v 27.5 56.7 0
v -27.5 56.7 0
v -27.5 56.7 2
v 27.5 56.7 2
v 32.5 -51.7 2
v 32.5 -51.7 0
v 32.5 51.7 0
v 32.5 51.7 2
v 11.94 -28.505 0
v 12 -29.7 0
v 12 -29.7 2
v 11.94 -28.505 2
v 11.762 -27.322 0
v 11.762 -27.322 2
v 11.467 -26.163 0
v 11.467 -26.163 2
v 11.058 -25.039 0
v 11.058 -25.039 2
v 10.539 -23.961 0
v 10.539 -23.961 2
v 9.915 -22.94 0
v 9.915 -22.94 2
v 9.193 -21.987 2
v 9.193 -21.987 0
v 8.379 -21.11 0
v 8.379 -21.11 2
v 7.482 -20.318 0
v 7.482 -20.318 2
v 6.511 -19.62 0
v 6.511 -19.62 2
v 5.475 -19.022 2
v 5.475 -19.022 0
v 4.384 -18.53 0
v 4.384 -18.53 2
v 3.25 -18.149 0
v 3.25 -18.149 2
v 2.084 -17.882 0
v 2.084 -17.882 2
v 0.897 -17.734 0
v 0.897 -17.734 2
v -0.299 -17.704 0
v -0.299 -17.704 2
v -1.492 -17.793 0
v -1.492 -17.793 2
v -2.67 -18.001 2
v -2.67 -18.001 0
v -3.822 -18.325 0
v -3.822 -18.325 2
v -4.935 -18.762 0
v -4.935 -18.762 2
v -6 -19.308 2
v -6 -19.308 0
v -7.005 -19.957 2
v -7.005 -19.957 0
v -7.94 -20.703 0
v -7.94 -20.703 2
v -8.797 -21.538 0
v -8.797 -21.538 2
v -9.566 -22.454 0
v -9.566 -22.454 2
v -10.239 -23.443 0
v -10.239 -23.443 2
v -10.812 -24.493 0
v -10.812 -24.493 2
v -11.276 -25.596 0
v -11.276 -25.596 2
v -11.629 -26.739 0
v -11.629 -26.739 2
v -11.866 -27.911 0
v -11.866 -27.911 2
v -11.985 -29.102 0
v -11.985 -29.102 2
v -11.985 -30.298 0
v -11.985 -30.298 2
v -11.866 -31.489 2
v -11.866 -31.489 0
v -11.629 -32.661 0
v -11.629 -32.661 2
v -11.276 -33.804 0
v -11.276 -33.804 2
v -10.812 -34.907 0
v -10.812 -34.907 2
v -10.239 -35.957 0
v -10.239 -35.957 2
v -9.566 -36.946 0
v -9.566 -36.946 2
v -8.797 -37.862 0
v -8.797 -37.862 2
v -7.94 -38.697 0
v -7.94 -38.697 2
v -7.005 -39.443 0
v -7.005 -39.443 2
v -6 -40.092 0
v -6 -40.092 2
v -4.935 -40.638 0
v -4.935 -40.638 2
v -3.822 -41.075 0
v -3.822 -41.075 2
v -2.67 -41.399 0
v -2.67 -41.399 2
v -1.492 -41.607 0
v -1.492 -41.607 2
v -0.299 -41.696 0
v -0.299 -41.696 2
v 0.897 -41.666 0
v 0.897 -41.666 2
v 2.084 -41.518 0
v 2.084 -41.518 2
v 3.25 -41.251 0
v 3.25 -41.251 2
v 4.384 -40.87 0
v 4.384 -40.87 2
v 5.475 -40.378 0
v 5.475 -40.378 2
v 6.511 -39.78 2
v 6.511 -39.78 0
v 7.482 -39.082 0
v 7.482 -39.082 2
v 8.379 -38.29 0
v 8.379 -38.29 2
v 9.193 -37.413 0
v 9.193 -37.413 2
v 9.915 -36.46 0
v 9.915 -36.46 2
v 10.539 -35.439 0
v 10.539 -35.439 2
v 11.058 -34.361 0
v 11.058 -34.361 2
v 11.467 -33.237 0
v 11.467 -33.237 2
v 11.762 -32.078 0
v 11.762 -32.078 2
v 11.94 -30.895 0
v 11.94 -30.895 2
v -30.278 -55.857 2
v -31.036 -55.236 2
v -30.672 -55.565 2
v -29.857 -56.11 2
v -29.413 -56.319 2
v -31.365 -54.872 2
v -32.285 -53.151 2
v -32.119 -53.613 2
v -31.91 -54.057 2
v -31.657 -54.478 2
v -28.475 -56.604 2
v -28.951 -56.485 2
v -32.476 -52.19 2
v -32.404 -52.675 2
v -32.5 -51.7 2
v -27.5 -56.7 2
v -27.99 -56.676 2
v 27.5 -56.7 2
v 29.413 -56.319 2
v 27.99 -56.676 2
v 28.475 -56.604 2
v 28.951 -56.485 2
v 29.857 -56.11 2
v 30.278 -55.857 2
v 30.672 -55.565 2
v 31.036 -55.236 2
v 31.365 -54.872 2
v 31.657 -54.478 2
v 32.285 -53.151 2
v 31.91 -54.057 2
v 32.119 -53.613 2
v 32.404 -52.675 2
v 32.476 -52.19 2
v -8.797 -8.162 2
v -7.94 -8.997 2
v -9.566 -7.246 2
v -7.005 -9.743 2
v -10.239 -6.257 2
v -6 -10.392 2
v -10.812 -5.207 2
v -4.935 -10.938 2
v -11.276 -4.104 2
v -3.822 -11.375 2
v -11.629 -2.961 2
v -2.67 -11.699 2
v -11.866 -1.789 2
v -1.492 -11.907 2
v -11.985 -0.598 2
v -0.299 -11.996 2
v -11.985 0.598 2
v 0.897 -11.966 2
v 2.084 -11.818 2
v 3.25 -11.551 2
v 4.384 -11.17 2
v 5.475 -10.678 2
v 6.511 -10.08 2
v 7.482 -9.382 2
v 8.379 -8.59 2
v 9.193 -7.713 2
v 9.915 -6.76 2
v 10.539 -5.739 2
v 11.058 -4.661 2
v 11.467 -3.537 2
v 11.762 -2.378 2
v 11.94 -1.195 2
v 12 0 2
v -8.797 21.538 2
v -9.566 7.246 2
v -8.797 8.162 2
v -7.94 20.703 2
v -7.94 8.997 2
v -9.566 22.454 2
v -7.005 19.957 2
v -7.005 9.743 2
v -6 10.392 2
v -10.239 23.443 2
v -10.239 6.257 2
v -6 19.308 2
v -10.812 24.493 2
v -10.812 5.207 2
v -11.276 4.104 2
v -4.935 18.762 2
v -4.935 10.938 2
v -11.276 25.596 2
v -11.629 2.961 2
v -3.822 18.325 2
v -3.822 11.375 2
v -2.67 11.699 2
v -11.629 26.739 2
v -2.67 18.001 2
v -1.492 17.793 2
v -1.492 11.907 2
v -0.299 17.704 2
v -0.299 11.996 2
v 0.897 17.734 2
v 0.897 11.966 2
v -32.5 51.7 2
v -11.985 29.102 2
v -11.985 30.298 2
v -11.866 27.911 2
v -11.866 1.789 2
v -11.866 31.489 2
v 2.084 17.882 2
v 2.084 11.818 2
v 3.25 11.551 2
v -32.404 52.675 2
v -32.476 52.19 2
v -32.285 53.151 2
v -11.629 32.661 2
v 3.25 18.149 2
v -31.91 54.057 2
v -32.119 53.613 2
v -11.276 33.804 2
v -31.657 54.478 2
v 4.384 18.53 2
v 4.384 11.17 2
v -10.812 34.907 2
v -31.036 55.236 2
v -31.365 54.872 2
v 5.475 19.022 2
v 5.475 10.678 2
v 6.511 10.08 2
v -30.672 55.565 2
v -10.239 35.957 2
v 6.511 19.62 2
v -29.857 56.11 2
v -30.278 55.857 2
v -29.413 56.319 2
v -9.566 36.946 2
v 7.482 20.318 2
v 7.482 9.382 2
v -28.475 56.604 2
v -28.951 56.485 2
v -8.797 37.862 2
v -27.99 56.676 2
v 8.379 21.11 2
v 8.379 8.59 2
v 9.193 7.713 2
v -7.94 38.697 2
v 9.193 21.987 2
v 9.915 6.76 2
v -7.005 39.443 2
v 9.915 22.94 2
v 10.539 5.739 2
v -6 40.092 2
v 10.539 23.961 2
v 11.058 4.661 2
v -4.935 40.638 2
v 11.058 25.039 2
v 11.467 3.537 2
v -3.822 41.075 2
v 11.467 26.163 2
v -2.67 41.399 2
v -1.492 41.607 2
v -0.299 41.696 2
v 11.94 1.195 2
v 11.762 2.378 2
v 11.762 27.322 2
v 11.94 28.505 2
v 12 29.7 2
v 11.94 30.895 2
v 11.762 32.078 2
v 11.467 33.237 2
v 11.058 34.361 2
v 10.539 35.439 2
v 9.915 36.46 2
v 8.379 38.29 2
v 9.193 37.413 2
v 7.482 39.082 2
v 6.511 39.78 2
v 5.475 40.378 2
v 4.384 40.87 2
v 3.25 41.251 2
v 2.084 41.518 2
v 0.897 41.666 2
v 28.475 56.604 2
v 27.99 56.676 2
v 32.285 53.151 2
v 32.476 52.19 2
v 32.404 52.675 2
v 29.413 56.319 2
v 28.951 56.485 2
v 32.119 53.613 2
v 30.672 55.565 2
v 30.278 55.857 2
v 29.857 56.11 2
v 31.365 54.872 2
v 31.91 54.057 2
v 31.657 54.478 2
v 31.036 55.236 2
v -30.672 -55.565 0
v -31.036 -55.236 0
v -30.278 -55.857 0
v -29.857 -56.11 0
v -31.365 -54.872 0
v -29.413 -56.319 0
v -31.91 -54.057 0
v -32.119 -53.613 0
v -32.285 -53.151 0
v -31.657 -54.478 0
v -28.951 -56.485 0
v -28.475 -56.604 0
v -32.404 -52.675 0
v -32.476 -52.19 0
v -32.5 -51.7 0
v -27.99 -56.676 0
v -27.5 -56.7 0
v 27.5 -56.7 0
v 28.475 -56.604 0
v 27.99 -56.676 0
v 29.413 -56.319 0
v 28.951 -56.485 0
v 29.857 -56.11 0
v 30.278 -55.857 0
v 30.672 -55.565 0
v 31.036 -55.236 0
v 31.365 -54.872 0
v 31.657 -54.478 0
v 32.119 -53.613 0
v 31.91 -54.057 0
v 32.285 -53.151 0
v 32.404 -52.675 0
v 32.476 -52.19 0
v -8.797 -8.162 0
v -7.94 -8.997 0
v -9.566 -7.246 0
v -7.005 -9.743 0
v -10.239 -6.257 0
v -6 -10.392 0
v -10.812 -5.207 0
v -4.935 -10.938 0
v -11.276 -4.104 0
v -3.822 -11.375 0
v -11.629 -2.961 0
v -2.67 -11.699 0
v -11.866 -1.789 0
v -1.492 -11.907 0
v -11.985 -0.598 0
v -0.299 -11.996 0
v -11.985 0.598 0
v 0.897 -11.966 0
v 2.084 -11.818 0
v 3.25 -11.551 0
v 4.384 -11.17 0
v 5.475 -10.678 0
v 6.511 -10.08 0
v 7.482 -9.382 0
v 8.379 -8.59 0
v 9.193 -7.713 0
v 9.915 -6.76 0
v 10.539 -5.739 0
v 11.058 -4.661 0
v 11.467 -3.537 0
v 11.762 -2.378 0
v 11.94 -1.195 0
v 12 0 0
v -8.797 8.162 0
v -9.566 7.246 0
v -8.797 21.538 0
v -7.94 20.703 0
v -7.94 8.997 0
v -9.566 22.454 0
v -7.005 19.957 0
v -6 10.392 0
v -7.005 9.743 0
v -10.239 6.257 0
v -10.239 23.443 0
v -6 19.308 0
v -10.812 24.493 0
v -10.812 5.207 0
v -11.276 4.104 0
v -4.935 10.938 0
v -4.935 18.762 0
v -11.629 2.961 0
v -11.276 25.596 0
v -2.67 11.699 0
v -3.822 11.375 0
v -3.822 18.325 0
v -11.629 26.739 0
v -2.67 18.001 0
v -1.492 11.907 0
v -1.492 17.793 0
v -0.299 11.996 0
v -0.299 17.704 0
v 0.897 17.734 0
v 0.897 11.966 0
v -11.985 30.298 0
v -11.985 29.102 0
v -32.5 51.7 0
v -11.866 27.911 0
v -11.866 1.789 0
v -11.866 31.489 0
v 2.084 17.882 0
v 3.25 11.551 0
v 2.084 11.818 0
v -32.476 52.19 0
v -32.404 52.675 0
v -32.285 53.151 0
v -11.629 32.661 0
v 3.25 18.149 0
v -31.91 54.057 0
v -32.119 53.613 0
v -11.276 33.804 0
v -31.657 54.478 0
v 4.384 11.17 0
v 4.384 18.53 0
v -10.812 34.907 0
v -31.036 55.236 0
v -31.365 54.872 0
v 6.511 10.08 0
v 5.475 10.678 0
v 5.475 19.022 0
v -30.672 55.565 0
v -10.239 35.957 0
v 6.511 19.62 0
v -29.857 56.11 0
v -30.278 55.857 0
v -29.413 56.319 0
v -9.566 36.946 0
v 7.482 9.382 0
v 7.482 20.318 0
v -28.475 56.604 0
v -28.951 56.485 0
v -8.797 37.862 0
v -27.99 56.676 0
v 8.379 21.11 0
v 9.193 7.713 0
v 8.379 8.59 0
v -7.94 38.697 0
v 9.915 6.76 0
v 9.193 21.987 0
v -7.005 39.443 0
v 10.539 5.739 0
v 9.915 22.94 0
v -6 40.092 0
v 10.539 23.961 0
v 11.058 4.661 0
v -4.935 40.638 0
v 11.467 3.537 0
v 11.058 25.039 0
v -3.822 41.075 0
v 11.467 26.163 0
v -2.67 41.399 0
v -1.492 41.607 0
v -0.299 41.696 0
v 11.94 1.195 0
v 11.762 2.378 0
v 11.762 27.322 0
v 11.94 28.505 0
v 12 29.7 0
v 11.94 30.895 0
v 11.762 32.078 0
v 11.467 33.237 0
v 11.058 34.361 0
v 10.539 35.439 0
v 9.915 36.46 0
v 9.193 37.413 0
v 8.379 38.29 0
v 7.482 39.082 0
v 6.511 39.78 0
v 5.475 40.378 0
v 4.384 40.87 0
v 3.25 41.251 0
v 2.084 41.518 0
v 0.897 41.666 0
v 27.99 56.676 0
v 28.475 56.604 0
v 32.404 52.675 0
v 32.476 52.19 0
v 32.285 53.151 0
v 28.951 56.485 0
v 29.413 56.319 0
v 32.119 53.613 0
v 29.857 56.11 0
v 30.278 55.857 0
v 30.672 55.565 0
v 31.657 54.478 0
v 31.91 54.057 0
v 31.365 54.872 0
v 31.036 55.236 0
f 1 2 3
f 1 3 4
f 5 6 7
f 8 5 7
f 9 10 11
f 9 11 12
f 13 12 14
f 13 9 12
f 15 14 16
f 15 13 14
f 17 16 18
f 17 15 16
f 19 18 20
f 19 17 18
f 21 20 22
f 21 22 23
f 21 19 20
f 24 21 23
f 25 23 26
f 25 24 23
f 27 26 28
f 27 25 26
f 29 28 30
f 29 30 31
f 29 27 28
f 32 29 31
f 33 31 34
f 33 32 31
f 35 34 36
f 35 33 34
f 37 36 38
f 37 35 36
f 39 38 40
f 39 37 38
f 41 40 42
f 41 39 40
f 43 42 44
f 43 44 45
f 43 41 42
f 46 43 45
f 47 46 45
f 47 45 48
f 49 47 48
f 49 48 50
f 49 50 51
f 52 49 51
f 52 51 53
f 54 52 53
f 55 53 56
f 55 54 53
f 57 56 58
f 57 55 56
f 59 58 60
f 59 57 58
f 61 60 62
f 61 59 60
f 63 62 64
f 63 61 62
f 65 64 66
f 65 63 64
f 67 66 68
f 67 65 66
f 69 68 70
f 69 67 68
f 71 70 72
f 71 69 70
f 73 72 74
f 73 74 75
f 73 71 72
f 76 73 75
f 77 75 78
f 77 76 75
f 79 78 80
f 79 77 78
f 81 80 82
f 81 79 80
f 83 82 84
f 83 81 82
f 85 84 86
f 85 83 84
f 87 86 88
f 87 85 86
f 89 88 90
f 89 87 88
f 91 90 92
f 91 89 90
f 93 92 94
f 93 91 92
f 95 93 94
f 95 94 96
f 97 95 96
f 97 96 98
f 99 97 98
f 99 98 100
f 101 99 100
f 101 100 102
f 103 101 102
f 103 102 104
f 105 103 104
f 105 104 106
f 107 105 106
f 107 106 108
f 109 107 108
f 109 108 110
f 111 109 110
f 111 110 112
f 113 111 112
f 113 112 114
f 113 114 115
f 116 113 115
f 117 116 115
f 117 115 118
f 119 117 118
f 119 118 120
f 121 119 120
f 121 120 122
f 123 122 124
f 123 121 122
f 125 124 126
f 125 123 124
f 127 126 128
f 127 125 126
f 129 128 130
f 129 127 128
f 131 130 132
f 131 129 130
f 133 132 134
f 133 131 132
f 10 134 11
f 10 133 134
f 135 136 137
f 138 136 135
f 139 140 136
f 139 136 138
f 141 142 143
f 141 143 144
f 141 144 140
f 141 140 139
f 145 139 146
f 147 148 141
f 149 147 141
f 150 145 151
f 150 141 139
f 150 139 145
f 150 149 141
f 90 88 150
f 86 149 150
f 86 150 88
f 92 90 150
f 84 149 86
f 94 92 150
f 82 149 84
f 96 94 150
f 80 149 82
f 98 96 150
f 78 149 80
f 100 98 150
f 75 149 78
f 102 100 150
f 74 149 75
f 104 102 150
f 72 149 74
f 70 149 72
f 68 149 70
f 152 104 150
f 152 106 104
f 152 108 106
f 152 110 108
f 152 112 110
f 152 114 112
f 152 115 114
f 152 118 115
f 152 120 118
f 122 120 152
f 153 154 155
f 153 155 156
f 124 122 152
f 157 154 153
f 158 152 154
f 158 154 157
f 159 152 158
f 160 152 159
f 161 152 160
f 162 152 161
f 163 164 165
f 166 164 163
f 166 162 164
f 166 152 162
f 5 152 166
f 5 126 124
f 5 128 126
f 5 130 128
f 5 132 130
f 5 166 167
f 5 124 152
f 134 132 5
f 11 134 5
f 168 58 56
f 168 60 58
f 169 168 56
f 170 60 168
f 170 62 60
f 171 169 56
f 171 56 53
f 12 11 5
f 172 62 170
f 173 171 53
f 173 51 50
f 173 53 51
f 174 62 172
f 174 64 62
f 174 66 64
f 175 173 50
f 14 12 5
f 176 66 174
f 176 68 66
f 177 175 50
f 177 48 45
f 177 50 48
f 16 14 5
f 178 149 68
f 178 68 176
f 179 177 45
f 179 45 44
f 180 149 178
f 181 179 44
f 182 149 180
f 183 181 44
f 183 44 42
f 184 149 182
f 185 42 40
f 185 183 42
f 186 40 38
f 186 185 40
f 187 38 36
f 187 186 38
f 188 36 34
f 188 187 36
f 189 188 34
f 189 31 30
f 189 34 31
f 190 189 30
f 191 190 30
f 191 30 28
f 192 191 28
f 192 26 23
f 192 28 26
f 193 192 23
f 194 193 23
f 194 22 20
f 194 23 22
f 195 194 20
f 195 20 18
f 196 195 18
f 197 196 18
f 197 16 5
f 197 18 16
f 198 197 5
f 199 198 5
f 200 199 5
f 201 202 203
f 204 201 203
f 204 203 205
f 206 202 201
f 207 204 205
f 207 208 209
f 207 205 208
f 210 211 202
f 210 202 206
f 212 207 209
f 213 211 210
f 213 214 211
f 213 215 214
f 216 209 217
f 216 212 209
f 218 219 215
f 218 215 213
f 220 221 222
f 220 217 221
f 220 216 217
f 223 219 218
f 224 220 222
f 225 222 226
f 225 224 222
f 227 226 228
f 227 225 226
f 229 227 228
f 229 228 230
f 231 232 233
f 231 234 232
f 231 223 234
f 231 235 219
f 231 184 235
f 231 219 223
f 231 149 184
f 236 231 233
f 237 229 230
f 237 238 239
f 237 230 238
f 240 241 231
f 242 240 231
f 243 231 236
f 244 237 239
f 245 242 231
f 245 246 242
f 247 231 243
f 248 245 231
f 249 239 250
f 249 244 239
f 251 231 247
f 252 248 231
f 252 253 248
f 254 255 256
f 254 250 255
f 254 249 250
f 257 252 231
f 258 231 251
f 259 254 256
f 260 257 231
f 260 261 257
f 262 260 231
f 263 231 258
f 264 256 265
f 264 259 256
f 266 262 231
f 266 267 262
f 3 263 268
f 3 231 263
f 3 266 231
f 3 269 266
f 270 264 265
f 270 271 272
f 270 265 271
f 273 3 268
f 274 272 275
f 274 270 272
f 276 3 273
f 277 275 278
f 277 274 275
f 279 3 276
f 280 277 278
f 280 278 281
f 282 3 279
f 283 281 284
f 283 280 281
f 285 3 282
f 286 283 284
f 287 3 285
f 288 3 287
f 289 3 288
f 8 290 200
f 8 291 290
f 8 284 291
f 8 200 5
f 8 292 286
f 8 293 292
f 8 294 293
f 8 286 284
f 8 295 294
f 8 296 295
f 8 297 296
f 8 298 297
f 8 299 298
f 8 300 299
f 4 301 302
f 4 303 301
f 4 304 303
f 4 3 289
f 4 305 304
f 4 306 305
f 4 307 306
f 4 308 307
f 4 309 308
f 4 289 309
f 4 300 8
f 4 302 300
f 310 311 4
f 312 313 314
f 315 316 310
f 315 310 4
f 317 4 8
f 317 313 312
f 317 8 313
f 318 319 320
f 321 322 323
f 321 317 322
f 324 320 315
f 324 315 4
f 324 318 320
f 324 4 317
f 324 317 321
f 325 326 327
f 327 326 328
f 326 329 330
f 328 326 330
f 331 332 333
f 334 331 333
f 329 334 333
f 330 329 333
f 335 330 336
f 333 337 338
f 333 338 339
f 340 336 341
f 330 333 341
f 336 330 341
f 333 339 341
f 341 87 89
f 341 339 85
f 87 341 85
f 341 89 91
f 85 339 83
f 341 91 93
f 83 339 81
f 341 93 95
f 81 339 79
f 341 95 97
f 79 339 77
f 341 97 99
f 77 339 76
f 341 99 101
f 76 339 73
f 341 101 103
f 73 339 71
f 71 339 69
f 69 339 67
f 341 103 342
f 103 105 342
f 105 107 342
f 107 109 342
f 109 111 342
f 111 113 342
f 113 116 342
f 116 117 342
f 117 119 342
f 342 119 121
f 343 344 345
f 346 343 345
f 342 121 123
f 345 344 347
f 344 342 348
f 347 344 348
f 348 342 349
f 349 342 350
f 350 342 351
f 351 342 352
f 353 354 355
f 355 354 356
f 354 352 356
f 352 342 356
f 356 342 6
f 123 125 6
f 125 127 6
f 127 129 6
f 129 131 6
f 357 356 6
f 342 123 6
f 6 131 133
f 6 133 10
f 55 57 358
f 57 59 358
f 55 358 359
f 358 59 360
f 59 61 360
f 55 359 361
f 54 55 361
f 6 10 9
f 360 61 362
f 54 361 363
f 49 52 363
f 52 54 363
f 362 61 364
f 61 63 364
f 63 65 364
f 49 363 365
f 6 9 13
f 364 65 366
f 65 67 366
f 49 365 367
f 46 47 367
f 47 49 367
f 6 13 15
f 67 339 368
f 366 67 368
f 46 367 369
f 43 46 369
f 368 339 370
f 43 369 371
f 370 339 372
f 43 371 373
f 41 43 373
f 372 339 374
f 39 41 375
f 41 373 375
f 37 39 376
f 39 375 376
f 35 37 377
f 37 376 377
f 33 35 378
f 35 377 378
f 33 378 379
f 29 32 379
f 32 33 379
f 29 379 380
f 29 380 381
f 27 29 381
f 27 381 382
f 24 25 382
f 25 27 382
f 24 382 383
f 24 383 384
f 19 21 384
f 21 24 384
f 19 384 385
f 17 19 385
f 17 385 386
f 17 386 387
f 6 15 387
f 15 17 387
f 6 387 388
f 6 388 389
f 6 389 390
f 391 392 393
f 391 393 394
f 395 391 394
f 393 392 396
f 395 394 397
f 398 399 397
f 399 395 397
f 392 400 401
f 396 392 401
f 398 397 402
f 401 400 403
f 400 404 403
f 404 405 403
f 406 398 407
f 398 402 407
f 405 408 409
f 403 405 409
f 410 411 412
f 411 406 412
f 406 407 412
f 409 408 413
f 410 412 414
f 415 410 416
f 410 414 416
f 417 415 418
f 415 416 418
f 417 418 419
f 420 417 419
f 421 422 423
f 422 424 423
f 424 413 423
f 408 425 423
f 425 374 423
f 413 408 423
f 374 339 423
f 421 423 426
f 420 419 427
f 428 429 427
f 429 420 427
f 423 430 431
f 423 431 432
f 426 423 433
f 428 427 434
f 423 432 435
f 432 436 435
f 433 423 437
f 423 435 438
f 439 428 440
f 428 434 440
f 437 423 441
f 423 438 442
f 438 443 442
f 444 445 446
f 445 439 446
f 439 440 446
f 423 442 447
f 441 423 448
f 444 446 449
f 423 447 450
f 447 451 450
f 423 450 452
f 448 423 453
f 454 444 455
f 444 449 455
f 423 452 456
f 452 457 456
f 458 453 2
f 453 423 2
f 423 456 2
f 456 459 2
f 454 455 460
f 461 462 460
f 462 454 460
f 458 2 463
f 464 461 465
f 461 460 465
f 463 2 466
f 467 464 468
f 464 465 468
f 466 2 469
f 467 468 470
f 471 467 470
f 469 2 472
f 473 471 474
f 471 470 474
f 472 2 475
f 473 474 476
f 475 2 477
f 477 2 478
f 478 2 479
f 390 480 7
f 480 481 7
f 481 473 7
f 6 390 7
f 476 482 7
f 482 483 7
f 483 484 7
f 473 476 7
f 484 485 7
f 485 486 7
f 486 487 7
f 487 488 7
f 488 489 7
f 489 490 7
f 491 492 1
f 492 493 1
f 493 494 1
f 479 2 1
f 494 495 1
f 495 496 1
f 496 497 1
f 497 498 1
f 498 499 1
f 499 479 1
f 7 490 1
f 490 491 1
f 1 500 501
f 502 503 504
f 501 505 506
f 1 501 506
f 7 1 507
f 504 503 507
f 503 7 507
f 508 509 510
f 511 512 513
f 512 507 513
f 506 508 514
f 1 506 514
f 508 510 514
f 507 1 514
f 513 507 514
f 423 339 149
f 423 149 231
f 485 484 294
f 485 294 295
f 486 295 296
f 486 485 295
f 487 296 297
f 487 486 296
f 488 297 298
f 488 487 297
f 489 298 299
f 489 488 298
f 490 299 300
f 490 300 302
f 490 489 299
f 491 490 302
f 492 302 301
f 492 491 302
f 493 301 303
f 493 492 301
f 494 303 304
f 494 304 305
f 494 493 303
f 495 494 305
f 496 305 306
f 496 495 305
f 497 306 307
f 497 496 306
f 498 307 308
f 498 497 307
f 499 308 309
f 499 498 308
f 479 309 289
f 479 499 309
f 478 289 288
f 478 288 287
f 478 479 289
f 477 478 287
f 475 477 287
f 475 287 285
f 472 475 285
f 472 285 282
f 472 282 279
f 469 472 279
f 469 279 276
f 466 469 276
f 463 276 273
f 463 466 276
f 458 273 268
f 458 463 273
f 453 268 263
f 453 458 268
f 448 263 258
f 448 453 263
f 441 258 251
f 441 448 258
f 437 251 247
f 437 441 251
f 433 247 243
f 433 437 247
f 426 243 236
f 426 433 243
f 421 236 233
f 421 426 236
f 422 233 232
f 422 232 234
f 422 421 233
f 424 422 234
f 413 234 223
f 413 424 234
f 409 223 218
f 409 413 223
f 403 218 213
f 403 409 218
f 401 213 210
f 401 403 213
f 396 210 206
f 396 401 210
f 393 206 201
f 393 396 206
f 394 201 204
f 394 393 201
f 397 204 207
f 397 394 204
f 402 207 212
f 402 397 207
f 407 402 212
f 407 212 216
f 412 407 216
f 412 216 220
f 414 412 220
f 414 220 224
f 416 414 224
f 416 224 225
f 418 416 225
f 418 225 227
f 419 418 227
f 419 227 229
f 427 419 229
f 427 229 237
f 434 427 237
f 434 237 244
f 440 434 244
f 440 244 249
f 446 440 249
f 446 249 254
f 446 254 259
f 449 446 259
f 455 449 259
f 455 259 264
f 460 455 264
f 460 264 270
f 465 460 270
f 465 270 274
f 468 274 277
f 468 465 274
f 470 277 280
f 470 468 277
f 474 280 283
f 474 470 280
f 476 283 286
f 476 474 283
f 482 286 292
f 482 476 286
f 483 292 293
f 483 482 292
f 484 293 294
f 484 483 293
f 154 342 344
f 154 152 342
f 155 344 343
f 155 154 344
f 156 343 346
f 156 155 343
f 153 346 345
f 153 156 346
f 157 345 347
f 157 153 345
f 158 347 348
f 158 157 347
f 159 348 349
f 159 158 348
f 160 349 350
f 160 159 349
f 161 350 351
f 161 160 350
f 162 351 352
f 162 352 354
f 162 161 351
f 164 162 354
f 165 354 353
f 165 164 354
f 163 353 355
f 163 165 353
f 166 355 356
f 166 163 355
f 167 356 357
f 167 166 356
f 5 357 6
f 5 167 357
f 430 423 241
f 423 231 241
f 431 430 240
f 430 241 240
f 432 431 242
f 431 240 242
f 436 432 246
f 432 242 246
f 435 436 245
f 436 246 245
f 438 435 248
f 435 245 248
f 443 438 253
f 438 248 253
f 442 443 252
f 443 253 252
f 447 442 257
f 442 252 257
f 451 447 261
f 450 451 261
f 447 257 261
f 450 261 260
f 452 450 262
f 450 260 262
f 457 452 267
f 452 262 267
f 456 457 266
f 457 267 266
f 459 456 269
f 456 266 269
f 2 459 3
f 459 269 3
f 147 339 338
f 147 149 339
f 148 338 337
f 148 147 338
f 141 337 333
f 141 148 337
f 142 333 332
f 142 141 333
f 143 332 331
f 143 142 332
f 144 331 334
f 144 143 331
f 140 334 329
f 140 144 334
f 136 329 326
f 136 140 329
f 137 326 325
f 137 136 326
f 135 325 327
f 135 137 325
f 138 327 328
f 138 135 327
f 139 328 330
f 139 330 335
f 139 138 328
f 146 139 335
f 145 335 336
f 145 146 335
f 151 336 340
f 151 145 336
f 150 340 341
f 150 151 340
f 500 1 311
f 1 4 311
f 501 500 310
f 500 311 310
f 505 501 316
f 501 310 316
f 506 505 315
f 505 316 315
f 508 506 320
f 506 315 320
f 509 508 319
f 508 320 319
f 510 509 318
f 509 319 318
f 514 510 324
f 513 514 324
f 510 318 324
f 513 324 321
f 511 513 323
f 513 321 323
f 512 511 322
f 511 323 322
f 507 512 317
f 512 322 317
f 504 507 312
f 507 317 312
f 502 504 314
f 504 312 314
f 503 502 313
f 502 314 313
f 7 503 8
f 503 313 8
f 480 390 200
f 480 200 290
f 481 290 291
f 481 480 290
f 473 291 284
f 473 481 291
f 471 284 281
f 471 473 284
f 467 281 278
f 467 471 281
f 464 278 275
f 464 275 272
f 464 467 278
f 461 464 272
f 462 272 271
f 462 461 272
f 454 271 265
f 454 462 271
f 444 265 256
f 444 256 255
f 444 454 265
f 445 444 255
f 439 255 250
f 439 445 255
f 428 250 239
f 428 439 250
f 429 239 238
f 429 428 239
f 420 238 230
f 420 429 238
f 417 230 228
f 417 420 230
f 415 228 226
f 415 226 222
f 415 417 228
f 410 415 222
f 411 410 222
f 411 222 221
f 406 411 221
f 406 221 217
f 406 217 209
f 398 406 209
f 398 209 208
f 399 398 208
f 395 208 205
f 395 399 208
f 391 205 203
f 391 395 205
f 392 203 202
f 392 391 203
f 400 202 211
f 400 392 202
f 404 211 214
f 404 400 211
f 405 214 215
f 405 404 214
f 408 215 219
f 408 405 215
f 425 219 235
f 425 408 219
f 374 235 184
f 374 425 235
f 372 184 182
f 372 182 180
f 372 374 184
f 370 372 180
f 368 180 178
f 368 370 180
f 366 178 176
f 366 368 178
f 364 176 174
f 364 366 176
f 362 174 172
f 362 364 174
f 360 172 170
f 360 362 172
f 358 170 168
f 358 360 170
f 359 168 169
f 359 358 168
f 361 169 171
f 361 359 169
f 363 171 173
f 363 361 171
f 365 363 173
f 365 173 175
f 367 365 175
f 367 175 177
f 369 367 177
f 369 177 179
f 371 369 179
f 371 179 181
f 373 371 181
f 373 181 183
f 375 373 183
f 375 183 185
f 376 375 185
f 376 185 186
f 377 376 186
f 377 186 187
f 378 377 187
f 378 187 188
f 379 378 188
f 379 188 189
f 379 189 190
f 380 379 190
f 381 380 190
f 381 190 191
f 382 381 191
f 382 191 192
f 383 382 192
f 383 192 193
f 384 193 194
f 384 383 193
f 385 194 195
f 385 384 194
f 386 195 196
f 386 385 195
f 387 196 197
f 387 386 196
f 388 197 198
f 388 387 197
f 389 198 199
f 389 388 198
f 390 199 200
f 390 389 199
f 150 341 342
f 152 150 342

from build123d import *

# Parameters (mm, degrees)
F0_W     = 65
F0_H     = 113.4
F0_R     = 12
F1_DEPTH = 2
F2_R     = 5


with BuildPart() as f1:
    # F0 (on Top) → F1 (new body)
    with BuildSketch(Plane.XY):
        Rectangle(F0_W, F0_H)
        with Locations((0, -29.7)):
            Circle(F0_R, mode=Mode.SUBTRACT)
        Circle(F0_R, mode=Mode.SUBTRACT)
        with Locations((0, 29.7)):
            Circle(F0_R, mode=Mode.SUBTRACT)
    extrude(amount=F1_DEPTH)

    # F2
    f2_edges = [f1.edges().sort_by_distance(p)[0] for p in [
        (-32.5, 56.7, 1),
        (32.5, 56.7, 1),
        (32.5, -56.7, 1),
        (-32.5, -56.7, 1),
    ]]
    fillet(f2_edges, radius=F2_R)


solid = f1.part
